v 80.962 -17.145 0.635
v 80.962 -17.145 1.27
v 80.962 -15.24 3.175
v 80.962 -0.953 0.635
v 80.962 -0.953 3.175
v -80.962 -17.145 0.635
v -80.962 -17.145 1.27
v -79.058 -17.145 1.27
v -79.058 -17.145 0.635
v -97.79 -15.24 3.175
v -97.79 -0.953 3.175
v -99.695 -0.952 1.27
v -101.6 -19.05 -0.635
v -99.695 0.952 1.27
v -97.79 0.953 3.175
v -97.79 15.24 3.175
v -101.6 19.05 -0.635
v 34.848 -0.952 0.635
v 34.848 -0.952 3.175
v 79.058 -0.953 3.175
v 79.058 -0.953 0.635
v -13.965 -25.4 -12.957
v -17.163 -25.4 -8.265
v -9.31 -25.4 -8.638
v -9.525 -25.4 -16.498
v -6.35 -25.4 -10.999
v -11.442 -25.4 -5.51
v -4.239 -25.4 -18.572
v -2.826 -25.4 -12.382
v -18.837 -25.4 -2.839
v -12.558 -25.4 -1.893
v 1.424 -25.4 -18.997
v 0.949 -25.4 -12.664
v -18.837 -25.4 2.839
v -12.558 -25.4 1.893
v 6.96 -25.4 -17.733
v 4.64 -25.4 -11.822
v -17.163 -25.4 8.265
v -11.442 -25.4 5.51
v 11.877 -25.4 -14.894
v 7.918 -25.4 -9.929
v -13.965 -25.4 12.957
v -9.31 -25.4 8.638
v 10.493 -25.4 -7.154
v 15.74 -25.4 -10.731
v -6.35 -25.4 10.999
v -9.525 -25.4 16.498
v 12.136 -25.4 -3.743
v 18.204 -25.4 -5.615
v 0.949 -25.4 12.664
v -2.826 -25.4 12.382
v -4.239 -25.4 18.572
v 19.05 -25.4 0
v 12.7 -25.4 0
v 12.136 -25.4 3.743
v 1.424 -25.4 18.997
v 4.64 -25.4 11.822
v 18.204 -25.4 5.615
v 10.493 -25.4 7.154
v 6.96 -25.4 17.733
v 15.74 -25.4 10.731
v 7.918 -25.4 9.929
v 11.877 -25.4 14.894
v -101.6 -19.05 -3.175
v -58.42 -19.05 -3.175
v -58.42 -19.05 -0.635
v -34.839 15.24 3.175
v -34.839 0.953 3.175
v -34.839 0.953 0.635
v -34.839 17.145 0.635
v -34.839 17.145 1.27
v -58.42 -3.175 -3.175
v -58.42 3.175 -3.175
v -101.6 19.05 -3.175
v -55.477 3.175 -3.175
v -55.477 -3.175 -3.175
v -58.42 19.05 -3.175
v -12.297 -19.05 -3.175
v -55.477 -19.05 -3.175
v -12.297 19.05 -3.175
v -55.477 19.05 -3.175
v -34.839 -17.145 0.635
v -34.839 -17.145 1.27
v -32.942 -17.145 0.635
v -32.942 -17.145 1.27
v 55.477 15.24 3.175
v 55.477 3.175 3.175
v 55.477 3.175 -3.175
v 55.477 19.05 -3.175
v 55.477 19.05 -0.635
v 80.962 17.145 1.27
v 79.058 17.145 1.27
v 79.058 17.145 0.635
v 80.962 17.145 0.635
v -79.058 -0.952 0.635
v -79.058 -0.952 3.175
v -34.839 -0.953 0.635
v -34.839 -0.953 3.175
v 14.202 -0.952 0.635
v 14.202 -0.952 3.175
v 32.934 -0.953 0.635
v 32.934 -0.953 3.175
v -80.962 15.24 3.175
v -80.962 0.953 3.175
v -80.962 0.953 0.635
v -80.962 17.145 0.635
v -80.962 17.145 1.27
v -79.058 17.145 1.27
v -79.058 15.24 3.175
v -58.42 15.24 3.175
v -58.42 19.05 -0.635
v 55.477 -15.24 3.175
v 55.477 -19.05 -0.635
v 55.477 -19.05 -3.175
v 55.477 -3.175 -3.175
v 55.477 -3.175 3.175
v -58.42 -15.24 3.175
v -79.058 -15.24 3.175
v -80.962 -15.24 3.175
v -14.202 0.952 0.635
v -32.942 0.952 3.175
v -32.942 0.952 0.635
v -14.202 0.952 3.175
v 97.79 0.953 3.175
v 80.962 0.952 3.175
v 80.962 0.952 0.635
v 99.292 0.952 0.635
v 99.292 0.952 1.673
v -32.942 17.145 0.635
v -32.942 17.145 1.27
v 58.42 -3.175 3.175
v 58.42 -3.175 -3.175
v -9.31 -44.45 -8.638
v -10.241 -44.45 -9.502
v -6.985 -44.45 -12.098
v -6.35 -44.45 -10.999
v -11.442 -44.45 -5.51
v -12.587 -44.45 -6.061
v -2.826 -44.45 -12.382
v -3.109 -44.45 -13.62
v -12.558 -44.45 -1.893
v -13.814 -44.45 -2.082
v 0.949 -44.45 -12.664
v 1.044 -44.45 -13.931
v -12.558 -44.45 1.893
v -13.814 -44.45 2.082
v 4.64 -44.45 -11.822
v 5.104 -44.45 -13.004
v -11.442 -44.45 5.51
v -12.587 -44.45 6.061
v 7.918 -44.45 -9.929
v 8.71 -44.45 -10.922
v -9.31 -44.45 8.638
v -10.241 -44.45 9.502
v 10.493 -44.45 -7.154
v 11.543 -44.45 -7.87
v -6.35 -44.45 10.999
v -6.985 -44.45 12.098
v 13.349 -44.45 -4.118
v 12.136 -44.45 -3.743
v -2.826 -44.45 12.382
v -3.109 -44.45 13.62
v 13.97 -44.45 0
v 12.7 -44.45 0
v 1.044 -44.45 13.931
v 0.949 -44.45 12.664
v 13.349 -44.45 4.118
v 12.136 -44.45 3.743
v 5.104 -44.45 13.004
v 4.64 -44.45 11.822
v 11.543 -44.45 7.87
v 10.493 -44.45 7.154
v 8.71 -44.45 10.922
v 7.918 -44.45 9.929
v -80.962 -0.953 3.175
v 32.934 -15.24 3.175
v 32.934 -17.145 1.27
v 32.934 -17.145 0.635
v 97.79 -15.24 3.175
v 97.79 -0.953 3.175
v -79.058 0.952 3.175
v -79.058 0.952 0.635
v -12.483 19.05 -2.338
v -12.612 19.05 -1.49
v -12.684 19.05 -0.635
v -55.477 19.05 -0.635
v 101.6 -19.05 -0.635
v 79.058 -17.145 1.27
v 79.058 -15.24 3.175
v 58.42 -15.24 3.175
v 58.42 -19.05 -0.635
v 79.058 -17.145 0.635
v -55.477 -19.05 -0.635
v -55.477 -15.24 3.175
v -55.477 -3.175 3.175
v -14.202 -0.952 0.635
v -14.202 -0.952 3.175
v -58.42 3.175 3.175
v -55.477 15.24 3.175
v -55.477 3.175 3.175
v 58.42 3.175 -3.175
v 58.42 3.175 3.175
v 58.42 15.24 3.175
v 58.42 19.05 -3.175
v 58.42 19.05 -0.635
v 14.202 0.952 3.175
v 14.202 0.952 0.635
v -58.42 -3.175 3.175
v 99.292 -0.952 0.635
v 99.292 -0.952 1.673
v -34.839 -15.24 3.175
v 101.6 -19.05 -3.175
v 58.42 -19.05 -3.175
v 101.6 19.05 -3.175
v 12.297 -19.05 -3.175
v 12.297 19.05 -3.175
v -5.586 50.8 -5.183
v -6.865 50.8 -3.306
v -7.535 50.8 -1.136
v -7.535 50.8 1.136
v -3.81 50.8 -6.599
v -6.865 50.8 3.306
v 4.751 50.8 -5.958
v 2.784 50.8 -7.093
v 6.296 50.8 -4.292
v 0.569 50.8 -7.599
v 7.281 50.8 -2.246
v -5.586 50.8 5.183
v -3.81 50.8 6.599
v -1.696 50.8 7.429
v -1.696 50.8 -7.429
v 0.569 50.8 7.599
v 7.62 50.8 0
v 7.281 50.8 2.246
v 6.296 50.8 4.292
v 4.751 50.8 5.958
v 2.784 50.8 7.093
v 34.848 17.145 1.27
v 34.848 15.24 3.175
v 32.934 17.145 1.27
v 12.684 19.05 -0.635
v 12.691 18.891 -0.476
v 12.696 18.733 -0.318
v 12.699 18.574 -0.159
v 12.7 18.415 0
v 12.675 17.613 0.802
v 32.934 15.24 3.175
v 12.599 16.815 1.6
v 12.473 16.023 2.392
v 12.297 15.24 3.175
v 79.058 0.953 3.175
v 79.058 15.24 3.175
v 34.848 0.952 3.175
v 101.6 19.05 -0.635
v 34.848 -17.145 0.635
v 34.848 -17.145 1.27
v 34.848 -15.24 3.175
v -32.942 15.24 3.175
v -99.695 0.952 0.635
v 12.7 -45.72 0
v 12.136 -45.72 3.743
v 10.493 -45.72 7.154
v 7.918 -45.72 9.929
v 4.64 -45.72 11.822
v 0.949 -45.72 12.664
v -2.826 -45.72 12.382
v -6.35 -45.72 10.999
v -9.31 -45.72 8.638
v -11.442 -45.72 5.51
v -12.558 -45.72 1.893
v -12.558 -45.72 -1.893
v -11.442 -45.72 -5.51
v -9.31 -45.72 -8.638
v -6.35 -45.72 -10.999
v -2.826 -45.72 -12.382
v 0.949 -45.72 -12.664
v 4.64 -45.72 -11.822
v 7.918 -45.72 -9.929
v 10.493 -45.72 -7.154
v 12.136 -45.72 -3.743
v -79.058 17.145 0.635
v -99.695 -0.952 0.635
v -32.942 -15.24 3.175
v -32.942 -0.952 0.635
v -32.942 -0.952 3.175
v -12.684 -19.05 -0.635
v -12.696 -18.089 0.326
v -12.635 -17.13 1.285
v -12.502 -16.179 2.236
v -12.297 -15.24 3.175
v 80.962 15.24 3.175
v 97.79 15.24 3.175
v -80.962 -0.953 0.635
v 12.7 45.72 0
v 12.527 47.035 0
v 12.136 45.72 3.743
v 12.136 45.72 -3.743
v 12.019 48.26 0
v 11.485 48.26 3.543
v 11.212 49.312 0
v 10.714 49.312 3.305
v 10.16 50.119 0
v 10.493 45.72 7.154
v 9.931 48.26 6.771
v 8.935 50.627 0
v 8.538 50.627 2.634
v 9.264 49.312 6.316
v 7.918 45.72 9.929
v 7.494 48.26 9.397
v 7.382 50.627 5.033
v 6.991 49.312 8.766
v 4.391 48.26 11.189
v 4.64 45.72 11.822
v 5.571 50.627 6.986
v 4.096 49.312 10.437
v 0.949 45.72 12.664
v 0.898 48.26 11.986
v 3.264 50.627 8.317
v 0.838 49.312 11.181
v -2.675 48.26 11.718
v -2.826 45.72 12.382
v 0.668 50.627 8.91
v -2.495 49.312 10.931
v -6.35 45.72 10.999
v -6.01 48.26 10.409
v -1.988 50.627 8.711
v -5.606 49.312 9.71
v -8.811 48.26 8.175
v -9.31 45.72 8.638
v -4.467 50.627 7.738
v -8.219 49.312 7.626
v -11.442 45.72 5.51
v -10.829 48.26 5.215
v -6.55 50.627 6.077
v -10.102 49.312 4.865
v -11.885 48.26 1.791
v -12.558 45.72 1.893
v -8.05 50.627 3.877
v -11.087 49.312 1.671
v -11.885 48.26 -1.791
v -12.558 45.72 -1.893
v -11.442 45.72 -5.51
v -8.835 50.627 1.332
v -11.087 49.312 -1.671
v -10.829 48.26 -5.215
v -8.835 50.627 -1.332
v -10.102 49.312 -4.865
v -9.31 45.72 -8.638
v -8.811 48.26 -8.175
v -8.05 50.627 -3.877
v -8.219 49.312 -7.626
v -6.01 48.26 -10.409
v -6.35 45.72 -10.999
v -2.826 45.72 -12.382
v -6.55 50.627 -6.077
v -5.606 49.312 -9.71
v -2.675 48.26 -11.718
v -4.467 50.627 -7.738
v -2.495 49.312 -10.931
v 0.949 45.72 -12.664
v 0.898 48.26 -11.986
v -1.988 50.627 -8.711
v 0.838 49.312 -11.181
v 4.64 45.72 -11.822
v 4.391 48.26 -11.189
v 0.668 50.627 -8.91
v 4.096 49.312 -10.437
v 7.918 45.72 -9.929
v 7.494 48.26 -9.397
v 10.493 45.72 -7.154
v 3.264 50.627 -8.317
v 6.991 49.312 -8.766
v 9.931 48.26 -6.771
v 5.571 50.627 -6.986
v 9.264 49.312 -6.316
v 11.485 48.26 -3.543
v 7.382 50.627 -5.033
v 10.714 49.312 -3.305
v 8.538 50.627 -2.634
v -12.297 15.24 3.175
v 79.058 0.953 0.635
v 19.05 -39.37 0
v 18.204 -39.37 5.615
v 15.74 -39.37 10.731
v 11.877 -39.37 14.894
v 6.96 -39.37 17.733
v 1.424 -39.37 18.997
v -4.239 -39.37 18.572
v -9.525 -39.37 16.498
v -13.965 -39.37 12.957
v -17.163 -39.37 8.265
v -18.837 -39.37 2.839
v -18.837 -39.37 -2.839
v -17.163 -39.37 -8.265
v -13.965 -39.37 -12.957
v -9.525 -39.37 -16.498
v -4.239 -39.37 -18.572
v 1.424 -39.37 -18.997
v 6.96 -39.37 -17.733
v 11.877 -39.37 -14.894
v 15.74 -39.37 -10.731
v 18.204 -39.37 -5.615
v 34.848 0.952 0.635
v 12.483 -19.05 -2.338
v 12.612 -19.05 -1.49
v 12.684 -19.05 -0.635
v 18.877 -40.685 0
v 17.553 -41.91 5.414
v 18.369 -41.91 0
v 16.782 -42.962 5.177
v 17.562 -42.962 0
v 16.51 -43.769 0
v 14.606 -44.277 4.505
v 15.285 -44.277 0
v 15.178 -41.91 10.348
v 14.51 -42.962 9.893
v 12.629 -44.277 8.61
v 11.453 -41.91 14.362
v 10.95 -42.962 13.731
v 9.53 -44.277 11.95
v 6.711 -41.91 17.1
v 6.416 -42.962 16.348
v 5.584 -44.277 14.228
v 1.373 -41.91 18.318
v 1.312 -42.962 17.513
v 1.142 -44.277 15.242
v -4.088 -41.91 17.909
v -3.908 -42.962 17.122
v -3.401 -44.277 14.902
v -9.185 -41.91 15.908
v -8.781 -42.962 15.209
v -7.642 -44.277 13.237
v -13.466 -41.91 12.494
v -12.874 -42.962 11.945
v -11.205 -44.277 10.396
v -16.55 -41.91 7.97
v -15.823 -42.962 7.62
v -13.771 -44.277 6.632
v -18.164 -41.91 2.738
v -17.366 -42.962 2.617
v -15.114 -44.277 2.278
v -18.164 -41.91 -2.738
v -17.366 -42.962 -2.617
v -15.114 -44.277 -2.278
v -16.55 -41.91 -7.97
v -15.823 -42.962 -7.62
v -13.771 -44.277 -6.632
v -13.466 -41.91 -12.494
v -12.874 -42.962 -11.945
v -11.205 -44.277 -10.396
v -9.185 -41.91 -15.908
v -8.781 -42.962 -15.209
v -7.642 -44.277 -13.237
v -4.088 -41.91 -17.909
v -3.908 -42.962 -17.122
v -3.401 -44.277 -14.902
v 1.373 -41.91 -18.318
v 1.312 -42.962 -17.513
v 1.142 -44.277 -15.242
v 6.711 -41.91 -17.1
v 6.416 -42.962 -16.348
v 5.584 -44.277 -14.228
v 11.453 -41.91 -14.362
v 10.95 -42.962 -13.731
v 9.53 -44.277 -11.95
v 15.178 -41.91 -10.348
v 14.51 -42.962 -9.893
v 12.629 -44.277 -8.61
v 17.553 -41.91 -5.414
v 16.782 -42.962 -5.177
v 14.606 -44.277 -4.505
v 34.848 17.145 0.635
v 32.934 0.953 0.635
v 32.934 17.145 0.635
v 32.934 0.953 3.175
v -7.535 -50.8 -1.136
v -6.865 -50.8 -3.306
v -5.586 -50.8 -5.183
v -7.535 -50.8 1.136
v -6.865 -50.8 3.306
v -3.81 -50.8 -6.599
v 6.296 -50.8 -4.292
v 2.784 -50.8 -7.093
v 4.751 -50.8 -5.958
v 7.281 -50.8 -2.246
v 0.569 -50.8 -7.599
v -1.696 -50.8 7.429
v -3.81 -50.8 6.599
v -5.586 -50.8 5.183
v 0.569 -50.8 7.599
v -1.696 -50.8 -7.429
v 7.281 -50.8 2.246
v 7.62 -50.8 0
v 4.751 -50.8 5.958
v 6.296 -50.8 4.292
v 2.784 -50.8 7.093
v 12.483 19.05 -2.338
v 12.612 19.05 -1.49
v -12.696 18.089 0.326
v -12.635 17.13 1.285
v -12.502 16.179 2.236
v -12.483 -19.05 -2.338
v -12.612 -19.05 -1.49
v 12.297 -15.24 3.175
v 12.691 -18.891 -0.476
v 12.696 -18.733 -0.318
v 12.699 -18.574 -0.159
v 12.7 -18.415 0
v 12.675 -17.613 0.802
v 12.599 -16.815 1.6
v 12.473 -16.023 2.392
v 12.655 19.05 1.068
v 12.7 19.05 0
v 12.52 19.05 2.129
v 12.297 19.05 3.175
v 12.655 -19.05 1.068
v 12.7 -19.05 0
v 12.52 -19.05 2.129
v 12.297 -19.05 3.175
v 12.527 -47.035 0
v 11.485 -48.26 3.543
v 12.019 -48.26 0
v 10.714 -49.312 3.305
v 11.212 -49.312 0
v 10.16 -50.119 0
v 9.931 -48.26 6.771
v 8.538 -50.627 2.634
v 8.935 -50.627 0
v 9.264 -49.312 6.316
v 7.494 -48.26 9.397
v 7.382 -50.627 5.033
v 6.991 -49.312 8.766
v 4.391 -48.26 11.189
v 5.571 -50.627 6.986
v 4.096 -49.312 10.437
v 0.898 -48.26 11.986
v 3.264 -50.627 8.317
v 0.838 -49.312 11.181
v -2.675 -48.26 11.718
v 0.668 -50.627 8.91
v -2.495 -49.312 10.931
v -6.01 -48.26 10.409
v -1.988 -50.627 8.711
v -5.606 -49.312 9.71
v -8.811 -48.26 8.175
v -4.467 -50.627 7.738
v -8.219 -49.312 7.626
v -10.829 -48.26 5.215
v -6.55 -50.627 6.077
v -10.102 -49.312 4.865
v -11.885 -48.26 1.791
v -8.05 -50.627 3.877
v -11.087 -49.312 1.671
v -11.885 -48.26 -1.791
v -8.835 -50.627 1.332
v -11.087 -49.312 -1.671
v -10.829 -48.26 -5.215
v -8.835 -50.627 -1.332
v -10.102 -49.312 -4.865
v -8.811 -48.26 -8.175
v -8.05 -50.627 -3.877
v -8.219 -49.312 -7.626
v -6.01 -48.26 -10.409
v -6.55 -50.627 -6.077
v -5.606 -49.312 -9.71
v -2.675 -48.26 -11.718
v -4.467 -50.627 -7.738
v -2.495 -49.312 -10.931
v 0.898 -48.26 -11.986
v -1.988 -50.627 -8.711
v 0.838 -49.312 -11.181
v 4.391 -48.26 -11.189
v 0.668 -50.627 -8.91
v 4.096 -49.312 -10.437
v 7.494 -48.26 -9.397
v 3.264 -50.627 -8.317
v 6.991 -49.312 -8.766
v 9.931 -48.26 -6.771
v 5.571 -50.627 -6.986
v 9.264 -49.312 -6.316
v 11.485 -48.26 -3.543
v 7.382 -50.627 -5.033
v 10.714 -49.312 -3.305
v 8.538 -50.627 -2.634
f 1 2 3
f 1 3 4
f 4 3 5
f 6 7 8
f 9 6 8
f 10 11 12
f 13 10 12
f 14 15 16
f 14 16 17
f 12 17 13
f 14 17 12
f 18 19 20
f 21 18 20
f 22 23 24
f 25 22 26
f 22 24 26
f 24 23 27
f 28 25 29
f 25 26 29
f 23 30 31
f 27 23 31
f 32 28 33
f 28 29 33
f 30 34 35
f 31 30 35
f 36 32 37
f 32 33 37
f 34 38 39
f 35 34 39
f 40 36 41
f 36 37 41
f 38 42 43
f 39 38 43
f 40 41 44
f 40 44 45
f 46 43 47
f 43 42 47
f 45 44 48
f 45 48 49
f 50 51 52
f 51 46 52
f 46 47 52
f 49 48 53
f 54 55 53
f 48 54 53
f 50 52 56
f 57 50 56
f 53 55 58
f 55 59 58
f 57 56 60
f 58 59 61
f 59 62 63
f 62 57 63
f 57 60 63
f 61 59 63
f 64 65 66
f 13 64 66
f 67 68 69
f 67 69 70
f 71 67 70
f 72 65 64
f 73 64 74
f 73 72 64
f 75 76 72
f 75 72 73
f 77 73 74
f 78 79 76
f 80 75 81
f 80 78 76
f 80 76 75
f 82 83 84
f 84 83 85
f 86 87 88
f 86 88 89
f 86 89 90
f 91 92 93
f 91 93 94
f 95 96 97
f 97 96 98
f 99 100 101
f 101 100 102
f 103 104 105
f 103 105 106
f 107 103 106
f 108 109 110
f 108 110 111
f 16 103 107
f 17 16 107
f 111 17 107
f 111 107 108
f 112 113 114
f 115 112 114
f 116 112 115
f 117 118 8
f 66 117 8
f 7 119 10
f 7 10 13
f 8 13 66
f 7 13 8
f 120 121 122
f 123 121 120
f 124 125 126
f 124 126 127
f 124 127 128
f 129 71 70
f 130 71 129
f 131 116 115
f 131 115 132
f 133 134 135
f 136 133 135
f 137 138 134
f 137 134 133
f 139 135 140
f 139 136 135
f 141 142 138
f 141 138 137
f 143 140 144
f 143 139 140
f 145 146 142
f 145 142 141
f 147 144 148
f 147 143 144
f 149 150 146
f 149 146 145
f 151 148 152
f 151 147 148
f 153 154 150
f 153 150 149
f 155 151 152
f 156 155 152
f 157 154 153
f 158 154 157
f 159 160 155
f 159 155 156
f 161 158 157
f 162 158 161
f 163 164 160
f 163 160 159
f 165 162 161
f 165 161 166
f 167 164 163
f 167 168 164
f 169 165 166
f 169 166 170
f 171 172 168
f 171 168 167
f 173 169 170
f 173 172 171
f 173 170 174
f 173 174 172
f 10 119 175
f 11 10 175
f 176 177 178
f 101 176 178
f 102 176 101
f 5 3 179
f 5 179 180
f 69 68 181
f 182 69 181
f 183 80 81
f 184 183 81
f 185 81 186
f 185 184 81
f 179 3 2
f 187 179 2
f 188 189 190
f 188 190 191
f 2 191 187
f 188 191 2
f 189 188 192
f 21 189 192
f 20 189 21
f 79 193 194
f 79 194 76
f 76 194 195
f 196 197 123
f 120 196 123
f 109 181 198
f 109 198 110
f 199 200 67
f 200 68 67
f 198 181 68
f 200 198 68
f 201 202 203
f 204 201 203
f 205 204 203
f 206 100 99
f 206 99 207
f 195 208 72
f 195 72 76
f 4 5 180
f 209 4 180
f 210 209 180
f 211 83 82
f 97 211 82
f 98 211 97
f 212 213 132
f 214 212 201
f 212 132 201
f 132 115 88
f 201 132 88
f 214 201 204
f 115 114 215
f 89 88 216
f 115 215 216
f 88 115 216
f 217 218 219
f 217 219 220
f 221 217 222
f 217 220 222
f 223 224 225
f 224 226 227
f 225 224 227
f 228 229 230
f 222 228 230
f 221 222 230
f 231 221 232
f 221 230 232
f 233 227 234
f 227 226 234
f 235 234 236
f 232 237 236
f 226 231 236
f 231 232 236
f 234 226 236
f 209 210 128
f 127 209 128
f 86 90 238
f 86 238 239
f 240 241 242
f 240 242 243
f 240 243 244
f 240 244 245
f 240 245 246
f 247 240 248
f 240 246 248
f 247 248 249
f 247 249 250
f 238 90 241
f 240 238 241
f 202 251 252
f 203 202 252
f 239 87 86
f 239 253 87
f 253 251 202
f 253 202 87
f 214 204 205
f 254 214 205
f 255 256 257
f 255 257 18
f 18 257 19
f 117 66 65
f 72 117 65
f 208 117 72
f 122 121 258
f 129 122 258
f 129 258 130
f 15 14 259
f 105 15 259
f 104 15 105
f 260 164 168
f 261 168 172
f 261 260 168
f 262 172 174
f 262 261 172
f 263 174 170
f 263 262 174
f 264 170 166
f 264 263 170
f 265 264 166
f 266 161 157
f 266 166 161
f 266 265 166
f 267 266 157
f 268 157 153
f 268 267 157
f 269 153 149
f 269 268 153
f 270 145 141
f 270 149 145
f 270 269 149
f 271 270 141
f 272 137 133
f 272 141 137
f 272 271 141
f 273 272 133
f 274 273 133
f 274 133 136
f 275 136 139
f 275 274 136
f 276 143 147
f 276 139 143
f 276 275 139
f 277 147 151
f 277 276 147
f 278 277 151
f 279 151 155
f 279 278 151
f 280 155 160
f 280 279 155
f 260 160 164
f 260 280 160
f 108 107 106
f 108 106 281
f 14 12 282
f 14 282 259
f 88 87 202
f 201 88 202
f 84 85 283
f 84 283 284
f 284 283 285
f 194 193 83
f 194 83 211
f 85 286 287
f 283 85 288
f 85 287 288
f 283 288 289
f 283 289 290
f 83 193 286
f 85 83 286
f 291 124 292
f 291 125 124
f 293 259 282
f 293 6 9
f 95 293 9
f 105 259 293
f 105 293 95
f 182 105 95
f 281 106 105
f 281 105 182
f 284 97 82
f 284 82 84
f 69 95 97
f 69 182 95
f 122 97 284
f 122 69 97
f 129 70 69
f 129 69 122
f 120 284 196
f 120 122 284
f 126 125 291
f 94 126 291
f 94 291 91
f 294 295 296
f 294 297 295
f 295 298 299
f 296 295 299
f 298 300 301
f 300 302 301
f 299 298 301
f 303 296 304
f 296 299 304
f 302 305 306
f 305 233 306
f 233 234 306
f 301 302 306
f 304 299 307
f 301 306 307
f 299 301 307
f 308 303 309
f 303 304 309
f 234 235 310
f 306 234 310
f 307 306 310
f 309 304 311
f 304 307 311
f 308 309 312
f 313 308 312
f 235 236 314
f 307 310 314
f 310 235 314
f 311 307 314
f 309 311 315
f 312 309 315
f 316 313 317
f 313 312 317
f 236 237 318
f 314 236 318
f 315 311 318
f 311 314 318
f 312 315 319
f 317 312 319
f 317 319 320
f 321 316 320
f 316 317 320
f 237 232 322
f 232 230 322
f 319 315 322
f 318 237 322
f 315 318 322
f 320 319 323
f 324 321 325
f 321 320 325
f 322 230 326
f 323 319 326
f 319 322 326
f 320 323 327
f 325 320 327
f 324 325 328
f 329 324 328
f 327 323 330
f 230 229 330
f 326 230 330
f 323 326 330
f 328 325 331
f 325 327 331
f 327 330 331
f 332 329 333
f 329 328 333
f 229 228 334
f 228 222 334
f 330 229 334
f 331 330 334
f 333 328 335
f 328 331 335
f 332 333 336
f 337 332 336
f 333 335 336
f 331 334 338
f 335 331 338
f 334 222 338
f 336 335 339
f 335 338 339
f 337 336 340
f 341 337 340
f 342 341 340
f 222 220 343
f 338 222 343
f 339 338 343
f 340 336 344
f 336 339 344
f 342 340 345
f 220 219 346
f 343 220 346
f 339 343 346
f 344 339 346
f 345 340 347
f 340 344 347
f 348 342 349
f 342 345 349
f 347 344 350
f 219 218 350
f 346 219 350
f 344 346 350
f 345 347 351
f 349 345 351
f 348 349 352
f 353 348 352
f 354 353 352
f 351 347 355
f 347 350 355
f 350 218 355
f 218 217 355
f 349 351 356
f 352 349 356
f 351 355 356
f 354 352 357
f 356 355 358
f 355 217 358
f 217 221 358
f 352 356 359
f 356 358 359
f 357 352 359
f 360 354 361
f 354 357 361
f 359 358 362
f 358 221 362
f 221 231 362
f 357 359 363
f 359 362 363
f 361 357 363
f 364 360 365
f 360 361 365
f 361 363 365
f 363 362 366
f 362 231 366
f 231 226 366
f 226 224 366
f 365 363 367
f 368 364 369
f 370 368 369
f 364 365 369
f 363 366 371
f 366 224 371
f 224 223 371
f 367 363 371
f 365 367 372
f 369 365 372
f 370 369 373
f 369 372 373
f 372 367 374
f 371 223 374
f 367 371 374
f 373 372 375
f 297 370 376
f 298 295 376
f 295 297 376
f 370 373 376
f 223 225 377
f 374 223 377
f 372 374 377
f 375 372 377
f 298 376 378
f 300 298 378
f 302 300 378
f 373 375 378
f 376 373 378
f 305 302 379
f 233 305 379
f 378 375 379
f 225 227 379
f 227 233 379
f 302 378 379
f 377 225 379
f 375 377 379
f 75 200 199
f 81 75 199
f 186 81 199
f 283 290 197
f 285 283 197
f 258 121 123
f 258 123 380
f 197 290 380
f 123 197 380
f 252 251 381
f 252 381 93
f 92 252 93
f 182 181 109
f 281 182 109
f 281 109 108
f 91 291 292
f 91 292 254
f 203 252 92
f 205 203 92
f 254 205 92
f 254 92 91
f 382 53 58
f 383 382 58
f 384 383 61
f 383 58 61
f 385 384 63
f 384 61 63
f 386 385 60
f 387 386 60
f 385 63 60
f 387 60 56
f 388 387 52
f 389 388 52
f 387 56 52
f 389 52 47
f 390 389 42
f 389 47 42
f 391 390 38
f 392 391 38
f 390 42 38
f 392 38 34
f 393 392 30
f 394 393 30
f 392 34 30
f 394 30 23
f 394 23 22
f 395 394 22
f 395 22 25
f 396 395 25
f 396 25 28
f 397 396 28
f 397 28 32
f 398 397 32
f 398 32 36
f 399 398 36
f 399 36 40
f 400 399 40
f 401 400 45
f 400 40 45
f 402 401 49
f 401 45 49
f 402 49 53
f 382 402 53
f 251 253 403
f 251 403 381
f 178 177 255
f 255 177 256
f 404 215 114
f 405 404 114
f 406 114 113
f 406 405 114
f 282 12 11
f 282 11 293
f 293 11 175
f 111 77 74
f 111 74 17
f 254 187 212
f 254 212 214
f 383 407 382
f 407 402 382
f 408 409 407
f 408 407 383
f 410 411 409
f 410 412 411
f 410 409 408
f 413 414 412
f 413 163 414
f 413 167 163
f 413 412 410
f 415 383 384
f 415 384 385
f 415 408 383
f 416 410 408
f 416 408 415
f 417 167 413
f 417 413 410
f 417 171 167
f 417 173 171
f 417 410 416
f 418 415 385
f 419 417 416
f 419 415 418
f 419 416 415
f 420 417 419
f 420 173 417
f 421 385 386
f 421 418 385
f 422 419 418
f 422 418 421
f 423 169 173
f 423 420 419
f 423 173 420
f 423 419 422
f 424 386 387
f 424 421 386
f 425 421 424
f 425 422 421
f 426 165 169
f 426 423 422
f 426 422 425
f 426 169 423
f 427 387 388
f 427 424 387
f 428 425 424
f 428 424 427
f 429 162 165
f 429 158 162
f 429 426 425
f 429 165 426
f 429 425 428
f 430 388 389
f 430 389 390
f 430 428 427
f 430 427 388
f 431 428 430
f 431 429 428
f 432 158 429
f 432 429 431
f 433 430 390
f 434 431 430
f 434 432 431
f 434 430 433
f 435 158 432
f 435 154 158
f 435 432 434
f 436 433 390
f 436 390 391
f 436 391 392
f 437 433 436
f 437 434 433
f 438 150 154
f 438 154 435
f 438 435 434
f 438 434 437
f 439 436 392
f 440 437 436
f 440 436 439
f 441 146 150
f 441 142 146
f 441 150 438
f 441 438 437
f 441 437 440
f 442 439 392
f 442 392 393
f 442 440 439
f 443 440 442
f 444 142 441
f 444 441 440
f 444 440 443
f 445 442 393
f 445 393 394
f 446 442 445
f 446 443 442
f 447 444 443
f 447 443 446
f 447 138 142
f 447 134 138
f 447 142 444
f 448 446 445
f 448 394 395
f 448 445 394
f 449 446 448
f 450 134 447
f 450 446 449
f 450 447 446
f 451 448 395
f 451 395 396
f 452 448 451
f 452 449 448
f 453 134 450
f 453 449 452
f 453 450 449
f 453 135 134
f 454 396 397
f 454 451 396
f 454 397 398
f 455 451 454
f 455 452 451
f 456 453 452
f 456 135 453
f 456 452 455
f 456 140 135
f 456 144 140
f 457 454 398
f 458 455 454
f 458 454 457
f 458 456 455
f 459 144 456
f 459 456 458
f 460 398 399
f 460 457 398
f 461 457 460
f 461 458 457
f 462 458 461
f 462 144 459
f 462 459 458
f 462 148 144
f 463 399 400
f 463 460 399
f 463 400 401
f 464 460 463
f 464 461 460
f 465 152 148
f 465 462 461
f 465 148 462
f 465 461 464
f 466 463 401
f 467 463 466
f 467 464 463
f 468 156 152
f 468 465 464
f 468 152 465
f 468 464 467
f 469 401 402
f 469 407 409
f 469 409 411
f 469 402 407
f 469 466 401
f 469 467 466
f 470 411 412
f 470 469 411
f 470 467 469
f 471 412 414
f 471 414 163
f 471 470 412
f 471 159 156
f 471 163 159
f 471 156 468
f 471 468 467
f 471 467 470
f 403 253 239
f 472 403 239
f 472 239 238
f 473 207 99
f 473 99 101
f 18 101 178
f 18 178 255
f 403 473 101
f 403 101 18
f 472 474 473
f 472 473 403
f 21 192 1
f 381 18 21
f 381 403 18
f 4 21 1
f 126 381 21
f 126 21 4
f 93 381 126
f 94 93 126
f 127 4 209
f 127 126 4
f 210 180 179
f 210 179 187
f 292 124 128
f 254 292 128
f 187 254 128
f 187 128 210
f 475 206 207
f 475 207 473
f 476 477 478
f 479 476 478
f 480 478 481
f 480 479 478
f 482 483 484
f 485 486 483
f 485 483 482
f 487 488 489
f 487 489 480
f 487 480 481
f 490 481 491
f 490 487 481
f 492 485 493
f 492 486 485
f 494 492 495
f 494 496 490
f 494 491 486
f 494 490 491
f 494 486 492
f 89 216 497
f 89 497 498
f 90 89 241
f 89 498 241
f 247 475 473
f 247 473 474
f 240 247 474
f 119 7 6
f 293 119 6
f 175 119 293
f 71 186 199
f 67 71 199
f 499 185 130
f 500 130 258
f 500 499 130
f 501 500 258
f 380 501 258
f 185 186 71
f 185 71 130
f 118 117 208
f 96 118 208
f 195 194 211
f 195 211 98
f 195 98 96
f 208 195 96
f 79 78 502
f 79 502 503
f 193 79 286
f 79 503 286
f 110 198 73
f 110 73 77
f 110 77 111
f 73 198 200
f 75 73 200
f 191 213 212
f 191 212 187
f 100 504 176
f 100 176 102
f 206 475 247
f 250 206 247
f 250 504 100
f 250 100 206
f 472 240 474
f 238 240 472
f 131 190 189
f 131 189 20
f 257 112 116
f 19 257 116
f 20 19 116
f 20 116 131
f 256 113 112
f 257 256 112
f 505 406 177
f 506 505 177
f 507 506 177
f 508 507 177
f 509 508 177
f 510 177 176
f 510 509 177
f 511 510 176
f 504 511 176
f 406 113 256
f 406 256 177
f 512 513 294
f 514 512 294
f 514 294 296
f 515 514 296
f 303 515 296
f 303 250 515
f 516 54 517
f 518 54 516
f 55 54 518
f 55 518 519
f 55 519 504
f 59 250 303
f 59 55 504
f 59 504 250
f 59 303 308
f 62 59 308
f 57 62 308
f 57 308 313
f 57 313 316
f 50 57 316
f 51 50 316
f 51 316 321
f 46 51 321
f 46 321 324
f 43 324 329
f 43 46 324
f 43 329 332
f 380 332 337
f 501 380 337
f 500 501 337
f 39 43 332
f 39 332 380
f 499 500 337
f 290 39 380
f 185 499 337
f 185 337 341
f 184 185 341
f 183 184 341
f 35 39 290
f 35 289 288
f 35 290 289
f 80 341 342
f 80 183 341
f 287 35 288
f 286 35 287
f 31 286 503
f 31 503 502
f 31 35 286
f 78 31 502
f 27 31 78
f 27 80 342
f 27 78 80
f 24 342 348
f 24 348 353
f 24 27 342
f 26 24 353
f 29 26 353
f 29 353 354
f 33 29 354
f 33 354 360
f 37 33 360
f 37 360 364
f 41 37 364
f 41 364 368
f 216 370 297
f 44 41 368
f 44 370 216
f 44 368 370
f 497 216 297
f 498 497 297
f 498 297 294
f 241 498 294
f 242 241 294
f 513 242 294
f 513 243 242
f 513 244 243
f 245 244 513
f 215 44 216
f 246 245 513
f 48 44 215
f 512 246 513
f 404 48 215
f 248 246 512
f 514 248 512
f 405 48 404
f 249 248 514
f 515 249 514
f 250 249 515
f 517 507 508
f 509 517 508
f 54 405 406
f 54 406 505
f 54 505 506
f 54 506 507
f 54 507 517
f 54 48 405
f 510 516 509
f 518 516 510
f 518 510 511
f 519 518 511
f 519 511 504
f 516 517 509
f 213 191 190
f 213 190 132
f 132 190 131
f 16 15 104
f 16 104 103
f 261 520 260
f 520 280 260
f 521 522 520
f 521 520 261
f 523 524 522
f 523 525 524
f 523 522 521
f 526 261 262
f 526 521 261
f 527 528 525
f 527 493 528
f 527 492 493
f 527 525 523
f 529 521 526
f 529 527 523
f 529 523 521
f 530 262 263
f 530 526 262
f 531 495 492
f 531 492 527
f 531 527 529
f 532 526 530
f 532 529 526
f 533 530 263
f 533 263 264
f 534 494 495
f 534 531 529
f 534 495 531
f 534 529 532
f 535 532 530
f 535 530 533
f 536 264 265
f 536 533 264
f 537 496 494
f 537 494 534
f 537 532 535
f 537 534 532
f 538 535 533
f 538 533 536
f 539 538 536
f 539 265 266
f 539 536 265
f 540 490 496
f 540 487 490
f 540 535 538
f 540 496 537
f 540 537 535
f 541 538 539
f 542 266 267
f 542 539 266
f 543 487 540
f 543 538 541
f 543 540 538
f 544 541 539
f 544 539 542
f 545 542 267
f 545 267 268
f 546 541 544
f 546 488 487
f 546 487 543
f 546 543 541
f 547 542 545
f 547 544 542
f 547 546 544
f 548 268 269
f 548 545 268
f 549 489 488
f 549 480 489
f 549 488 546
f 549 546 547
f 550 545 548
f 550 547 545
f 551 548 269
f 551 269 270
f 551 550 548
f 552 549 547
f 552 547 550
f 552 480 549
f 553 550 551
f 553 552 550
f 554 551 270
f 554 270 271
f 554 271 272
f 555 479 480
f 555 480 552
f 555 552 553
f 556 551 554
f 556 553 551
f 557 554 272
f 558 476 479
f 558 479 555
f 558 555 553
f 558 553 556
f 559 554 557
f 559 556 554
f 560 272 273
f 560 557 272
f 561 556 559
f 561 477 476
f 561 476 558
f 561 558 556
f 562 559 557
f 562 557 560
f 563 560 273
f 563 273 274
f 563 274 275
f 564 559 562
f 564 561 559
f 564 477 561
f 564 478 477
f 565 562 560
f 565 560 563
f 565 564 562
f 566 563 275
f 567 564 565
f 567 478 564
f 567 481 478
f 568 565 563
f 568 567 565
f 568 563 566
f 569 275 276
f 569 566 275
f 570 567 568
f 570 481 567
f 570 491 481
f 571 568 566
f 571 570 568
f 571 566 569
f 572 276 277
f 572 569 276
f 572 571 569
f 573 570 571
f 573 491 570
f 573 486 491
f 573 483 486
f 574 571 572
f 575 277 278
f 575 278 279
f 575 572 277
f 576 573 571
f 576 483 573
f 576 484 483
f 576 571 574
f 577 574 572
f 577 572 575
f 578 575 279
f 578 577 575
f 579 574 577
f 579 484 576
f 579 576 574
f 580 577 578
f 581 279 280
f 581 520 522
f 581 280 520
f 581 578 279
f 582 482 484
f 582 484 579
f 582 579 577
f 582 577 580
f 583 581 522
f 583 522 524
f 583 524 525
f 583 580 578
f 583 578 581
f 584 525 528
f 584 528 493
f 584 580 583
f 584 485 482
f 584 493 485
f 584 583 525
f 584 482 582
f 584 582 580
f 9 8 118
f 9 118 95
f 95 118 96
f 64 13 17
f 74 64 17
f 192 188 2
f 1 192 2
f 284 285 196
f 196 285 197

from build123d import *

# Parameters (mm, degrees)
F1_R          = 12.7
F2_DEPTH      = 101.6
F3_R          = 5.08
F4_W          = 38.1
F4_H          = 6.35
F5_DEPTH      = 101.6
F6_DEPTH      = 101.6
F7_W          = 2.9432778758
F7_H          = 15.875
F8_DEPTH      = 25.4
F9_W          = 2.9432778758
F9_H          = 15.875
F10_DEPTH     = 25.4
F11_W         = 1.905
F11_H         = 16.1925
F11_W_2       = 18.7325
F11_H_2       = 1.905
F11_W_3       = 44.2182778758
F11_W_4       = 1.8969494015
F11_W_5       = 18.7405505985
F12_DEPTH     = 2.54
F13_W         = 18.7325
F13_H         = 1.905
F13_W_2       = 1.9137861806
F13_H_2       = 16.1925
F13_W_3       = 44.2094916952
F13_W_4       = 1.905
F13_W_5       = 18.3292221242
F14_DEPTH     = 2.54
F15_T1_DEPTH  = 57.6962243683
F15_T3_DEPTH  = 62.7762243683
F15_T5_DEPTH  = 62.7762243683
F15_T10_DEPTH = 62.7762243683
F15_S11_R     = 12.7
F15_T12_DEPTH = 33
F15_T16_DEPTH = 62.7762243683
F15_S17_R     = 12.7
F15_T18_DEPTH = 33
F15_T22_DEPTH = 62.7762243683
F15_S23_R     = 12.7
F15_T24_DEPTH = 33
F15_T28_DEPTH = 62.7762243683
F15_S29_R     = 12.7
F15_T30_DEPTH = 33
F17_R         = 19.05
F18_DEPTH     = 19.05
F19_R         = 5.08


# Not quite as in the source:
# - a fillet or chamfer that OpenCascade refuses, or shapes differently, is made with other operations: its cross-section is extruded or revolved along the edge and cut away or added


with BuildPart() as f2:
    # F1 (on offset) → F2 (new body)
    with BuildSketch(Plane.XZ.offset(50.8)):
        Circle(F1_R)
    extrude(amount=-F2_DEPTH)

    # F3
    f3_edges = [f2.edges().sort_by_distance(p)[0] for p in [
        (-12.7, -50.8, 0),
        (-12.7, 50.8, 0),
    ]]
    fillet(f3_edges, radius=F3_R)

    # F4 (on Right) → F5 (join)
    with BuildSketch(Plane.YZ):
        Rectangle(F4_W, F4_H)
    extrude(amount=F5_DEPTH)

    # F4 (on Right) → F6 (join)
    with BuildSketch(Plane.YZ):
        Rectangle(F4_W, F4_H)
    extrude(amount=-F6_DEPTH)

    # F7 (on face) → F8 (cut)
    with BuildSketch(Plane.XY.offset(3.175)):
        with Locations((-56.9483610621, 11.1125)):
            Rectangle(F7_W, F7_H)
        with Locations((-56.9483610621, -11.1125)):
            Rectangle(F7_W, F7_H)
    extrude(amount=-F8_DEPTH, mode=Mode.SUBTRACT)

    # F9 (on face) → F10 (cut)
    with BuildSketch(Plane.XY.offset(3.175)):
        with Locations((56.9483610621, 11.1125)):
            Rectangle(F9_W, F9_H)
        with Locations((56.9483610621, -11.1125)):
            Rectangle(F9_W, F9_H)
    extrude(amount=-F10_DEPTH, mode=Mode.SUBTRACT)

    # F11 (on face) → F12 (cut)
    with BuildSketch(Plane.XY.offset(3.175)):
        with Locations((-80.01, 9.04875)):
            Rectangle(F11_W, F11_H)
        with Locations((-90.32875, 0)):
            Rectangle(F11_W_2, F11_H_2)
        with Locations((-80.01, 0)):
            Rectangle(F11_W, F11_H_2)
        with Locations((-80.01, -9.04875)):
            Rectangle(F11_W, F11_H)
        with Locations((-56.9483610621, 0)):
            Rectangle(F11_W_3, F11_H_2)
        with Locations((-33.8907474235, -9.04875)):
            Rectangle(F11_W_4, F11_H)
        with Locations((-33.8907474235, 0)):
            Rectangle(F11_W_4, F11_H_2)
        with Locations((-33.8907474235, 9.04875)):
            Rectangle(F11_W_4, F11_H)
        with Locations((-23.5719974235, 0)):
            Rectangle(F11_W_5, F11_H_2)
    extrude(amount=-F12_DEPTH, mode=Mode.SUBTRACT)

    # F13 (on face) → F14 (cut)
    with BuildSketch(Plane.XY.offset(3.175)):
        with Locations((23.5679721242, 0)):
            Rectangle(F13_W, F13_H)
        with Locations((33.8911152145, 9.04875)):
            Rectangle(F13_W_2, F13_H_2)
        with Locations((33.8911152145, 0)):
            Rectangle(F13_W_2, F13_H)
        with Locations((33.8911152145, -9.04875)):
            Rectangle(F13_W_2, F13_H_2)
        with Locations((56.9527541524, 0)):
            Rectangle(F13_W_3, F13_H)
        with Locations((80.01, 9.04875)):
            Rectangle(F13_W_4, F13_H_2)
        with Locations((80.01, 0)):
            Rectangle(F13_W_4, F13_H)
        with Locations((90.1271110621, 0)):
            Rectangle(F13_W_5, F13_H)
        with Locations((80.01, -9.04875)):
            Rectangle(F13_W_4, F13_H_2)
    extrude(amount=-F14_DEPTH, mode=Mode.SUBTRACT)

    # F15: chamfer of 3.81 on 10 edges, made by hand

    # F15_s2 → F15_t1 (cut)
    with BuildSketch(Plane.XZ.offset(-28.8481121842)):
        Polygon((-97.79, 3.175), (-101.6, -0.635), (-101.6, 3.175), align=None)
        Polygon((97.79, 3.175), (101.6, -0.635), (101.6, 3.175), align=None)
    extrude(amount=F15_T1_DEPTH, mode=Mode.SUBTRACT)

    # F15_s4 → F15_t3 (cut)
    with BuildSketch(Plane.YZ.offset(48.6218878158)):
        Polygon((15.24, 3.175), (19.05, -0.635), (19.05, 3.175), align=None)
        Polygon((-15.24, 3.175), (-19.05, -0.635), (-19.05, 3.175), align=None)
    extrude(amount=F15_T3_DEPTH, mode=Mode.SUBTRACT)

    # F15_s6 → F15_t5 (cut)
    with BuildSketch(Plane.YZ.offset(-111.3981121842)):
        Polygon((-15.24, 3.175), (-19.05, -0.635), (-19.05, 3.175), align=None)
        Polygon((15.24, 3.175), (19.05, -0.635), (19.05, 3.175), align=None)
    extrude(amount=F15_T5_DEPTH, mode=Mode.SUBTRACT)


with BuildPart() as f15_tool8:
    # F15_s9 → F15_t10 (new body)
    with BuildSketch(Plane.YZ.offset(2.4986099401)):
        Polygon((19.05, -0.635), (15.24, 3.175), (19.05, 3.175), align=None)
    extrude(amount=F15_T10_DEPTH)

    # F15_s11 → F15_t12 (cut, symmetric)
    with BuildSketch(Plane.XZ.offset(-17.1)):
        Circle(F15_S11_R)
    extrude(amount=F15_T12_DEPTH, both=True, mode=Mode.SUBTRACT)


with BuildPart() as f2_1:
    add(f2.part)

    # F15_t7: cut F15_tool8
    add(f15_tool8.part, mode=Mode.SUBTRACT)


with BuildPart() as f15_tool14:
    # F15_s15 → F15_t16 (new body)
    with BuildSketch(Plane.YZ.offset(2.4986099401)):
        Polygon((-19.05, -0.635), (-15.24, 3.175), (-19.05, 3.175), align=None)
    extrude(amount=F15_T16_DEPTH)

    # F15_s17 → F15_t18 (cut, symmetric)
    with BuildSketch(Plane.XZ.offset(17.1)):
        Circle(F15_S17_R)
    extrude(amount=F15_T18_DEPTH, both=True, mode=Mode.SUBTRACT)


with BuildPart() as f2_2:
    add(f2_1.part)

    # F15_t13: cut F15_tool14
    add(f15_tool14.part, mode=Mode.SUBTRACT)


with BuildPart() as f15_tool20:
    # F15_s21 → F15_t22 (new body)
    with BuildSketch(Plane.YZ.offset(-2.4986099401)):
        Polygon((-19.05, -0.635), (-15.24, 3.175), (-19.05, 3.175), align=None)
    extrude(amount=-F15_T22_DEPTH)

    # F15_s23 → F15_t24 (cut, symmetric)
    with BuildSketch(Plane.XZ.offset(17.1)):
        Circle(F15_S23_R)
    extrude(amount=F15_T24_DEPTH, both=True, mode=Mode.SUBTRACT)


with BuildPart() as f2_3:
    add(f2_2.part)

    # F15_t19: cut F15_tool20
    add(f15_tool20.part, mode=Mode.SUBTRACT)


with BuildPart() as f15_tool26:
    # F15_s27 → F15_t28 (new body)
    with BuildSketch(Plane.YZ.offset(-2.4986099401)):
        Polygon((19.05, -0.635), (15.24, 3.175), (19.05, 3.175), align=None)
    extrude(amount=-F15_T28_DEPTH)

    # F15_s29 → F15_t30 (cut, symmetric)
    with BuildSketch(Plane.XZ.offset(-17.1)):
        Circle(F15_S29_R)
    extrude(amount=F15_T30_DEPTH, both=True, mode=Mode.SUBTRACT)


with BuildPart() as f2_4:
    add(f2_3.part)

    # F15_t25: cut F15_tool26
    add(f15_tool26.part, mode=Mode.SUBTRACT)

    # F17 (on offset) → F18 (join)
    with BuildSketch(Plane.XZ.offset(25.4)):
        Circle(F17_R)
    extrude(amount=F18_DEPTH)

    # F19
    f19_edges = [f2_4.edges().sort_by_distance(p)[0] for p in [
        (-19.05, -44.45, 0),
        (-7.62, -50.8, 0),
    ]]
    fillet(f19_edges, radius=F19_R)


solid = f2_4.part
